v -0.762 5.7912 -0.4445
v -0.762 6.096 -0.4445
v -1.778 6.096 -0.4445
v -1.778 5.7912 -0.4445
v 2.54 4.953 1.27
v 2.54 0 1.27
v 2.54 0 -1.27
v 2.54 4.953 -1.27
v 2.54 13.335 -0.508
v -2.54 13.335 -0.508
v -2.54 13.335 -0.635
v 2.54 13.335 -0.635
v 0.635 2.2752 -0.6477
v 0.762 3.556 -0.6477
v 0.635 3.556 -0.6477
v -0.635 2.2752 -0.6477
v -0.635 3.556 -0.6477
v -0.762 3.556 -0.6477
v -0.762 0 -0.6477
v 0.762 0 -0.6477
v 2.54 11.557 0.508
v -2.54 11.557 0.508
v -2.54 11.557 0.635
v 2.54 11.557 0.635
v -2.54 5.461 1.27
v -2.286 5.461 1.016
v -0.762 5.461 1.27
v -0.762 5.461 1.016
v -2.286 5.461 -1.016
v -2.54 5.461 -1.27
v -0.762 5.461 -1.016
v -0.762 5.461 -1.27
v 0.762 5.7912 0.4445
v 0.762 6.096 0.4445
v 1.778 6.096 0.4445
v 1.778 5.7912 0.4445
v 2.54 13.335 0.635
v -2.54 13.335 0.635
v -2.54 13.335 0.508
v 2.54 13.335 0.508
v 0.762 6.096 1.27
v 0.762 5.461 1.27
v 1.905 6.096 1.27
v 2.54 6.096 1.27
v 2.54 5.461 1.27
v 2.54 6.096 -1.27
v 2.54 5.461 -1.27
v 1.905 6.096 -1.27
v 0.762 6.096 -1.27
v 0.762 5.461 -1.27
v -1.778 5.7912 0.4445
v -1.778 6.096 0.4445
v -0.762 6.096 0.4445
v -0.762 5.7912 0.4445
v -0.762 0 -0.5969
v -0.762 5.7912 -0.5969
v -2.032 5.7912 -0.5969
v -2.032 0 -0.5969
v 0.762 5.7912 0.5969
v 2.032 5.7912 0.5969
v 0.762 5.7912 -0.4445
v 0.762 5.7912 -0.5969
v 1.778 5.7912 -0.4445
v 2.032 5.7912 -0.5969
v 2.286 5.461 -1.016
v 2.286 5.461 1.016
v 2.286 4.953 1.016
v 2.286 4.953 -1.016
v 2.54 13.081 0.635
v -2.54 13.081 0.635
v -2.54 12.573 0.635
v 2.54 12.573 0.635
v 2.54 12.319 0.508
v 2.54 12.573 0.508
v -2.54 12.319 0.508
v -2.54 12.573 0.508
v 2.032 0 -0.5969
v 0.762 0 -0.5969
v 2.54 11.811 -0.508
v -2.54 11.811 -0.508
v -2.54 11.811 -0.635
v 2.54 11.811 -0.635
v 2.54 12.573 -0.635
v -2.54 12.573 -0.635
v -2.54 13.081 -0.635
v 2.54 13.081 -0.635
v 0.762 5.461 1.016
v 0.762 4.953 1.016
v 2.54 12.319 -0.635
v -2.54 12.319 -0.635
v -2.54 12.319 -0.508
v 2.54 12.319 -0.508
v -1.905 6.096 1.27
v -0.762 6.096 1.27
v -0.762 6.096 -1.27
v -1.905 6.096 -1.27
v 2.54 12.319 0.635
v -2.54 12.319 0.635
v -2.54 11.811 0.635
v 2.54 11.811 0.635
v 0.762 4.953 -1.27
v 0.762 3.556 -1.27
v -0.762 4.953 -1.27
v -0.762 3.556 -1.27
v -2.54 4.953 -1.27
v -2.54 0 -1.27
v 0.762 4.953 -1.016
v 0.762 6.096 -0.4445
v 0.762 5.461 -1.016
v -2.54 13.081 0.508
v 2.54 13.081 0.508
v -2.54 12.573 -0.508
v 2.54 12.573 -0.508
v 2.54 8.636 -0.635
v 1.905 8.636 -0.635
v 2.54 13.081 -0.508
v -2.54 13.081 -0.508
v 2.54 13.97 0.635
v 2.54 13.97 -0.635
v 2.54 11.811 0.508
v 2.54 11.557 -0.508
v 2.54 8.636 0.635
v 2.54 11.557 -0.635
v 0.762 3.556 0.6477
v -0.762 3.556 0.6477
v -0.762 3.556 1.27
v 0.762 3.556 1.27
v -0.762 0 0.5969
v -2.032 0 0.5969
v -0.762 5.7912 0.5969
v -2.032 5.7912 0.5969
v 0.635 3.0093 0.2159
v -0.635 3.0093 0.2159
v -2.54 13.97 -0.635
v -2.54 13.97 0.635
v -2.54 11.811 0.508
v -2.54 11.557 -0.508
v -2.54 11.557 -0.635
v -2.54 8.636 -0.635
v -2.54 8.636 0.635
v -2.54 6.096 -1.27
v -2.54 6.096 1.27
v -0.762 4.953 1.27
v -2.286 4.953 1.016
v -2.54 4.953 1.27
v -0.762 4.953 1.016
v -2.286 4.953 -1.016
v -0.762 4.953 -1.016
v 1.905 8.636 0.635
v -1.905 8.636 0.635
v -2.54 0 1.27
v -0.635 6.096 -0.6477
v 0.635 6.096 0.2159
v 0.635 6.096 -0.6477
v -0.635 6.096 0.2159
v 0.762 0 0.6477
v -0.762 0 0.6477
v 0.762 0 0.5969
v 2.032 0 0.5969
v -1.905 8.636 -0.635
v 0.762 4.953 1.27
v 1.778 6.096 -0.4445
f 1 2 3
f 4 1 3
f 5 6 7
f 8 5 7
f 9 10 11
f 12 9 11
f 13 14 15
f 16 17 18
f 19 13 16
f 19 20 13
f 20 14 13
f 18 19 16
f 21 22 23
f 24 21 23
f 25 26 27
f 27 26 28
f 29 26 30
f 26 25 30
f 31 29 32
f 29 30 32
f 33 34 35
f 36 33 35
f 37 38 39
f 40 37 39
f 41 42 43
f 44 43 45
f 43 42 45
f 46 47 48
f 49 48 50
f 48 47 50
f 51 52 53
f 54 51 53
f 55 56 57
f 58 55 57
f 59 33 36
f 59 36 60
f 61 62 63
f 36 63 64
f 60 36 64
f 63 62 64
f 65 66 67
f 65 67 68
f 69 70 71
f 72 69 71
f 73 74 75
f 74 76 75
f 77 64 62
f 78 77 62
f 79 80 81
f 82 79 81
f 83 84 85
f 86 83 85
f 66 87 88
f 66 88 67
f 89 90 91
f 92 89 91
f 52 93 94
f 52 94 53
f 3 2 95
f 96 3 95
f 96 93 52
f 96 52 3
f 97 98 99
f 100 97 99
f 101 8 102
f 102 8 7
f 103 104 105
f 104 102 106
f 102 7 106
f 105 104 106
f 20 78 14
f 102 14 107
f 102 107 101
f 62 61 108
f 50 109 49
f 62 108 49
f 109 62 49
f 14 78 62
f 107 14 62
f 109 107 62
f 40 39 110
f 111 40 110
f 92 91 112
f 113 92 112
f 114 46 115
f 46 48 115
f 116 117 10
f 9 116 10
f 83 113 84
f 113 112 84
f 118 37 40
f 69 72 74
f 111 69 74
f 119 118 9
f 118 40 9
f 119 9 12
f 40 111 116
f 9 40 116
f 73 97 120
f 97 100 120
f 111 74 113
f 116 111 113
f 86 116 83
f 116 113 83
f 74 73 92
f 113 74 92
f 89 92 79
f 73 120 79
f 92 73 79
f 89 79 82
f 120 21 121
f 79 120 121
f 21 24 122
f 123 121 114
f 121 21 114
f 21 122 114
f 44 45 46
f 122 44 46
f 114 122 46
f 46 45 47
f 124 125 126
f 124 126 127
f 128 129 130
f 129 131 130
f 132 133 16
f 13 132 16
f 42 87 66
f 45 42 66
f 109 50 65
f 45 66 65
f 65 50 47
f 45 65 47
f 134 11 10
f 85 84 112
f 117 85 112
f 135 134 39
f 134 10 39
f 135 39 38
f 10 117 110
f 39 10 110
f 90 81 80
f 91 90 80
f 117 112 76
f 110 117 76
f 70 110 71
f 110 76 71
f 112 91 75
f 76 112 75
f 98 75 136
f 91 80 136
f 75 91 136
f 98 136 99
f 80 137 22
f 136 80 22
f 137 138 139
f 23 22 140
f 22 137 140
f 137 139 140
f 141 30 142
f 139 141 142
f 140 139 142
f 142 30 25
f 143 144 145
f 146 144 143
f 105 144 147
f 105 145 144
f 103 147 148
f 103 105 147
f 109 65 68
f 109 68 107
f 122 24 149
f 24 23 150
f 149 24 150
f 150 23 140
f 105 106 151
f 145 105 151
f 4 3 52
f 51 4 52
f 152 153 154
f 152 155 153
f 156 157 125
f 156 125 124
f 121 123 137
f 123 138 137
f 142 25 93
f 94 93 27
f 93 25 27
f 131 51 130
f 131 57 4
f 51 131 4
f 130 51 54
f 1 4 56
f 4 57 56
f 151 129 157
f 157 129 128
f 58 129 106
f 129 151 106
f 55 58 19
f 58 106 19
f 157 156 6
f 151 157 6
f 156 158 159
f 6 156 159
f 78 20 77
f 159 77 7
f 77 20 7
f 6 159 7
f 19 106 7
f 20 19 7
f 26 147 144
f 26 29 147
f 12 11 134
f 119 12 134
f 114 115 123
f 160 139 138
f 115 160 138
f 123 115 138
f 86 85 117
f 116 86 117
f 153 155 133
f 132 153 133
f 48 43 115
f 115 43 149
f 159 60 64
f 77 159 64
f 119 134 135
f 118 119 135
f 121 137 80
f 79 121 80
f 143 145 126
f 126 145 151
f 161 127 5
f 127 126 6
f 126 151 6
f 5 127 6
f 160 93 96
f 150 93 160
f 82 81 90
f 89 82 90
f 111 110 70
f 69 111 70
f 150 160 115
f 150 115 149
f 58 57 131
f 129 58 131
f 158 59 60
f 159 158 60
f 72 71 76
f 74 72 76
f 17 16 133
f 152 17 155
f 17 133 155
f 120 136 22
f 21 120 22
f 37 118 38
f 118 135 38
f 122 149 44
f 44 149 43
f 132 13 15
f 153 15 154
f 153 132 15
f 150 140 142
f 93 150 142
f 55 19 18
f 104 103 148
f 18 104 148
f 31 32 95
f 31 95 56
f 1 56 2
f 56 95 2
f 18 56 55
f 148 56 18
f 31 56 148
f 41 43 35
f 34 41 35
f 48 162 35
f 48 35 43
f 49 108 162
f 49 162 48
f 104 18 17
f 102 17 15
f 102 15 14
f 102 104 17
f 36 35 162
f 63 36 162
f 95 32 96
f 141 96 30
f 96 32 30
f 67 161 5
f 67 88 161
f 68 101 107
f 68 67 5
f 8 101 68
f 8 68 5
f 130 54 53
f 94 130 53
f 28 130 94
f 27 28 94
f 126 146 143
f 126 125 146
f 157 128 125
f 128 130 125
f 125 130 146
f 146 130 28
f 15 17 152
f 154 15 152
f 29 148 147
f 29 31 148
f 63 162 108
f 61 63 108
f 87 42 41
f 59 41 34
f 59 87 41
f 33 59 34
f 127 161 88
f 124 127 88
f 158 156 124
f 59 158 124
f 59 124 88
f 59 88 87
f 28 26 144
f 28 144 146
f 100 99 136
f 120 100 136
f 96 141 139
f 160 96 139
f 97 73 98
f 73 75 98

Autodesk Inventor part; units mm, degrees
sketch "Sketch_1" plane through (0, 0, 0) normal (0, 1, 0) x (1, 0, 0)
  line L0 (-2.54, 1.27) -> (-2.54, -1.27)
  line L1 (-2.54, -1.27) -> (2.54, -1.27)
  line L2 (2.54, -1.27) -> (2.54, 1.27)
  line L3 (2.54, 1.27) -> (-2.54, 1.27)
extrude "Extrusion1" add sketch "Sketch_1" along normal blind 6.096
sketch "Sketch_2" plane through (0, 5.461, 0) normal (0, 1, 0) x (1, 0, 0)
  line L0 (-2.794, 2.54) -> (-2.794, -2.54)
  line L1 (-2.794, -2.54) -> (2.794, -2.54)
  line L2 (2.794, -2.54) -> (2.794, 2.54)
  line L3 (2.794, 2.54) -> (-2.794, 2.54)
  line L4 (-2.286, 1.016) -> (-2.286, -1.016)
  line L5 (-2.286, -1.016) -> (2.286, -1.016)
  line L6 (2.286, -1.016) -> (2.286, 1.016)
  line L7 (2.286, 1.016) -> (-2.286, 1.016)
extrude "Extrusion2" cut sketch "Sketch_2" against normal blind 0.508
sketch "Sketch_3" plane through (0, 6.096, 0) normal (0, 1, 0) x (1, 0, 0)
  line L0 (-0.762, 1.27) -> (-0.762, -1.27)
  line L1 (-0.762, -1.27) -> (0.762, -1.27)
  line L2 (0.762, -1.27) -> (0.762, 1.27)
  line L3 (0.762, 1.27) -> (-0.762, 1.27)
extrude "Extrusion3" cut sketch "Sketch_3" against normal blind 2.54
sketch "Sketch_4" plane through (0, 6.096, 0) normal (0, 1, 0) x (1, 0, 0)
  line L0 (-1.778, 0.4445) -> (-1.778, -0.4445)
  line L1 (-1.778, -0.4445) -> (1.778, -0.4445)
  line L2 (1.778, -0.4445) -> (1.778, 0.4445)
  line L3 (1.778, 0.4445) -> (-1.778, 0.4445)
extrude "Extrusion4" cut sketch "Sketch_4" against normal blind 6.096
sketch "Sketch_5" plane through (0, 5.7912, 0) normal (0, 1, 0) x (1, 0, 0)
  line L0 (-2.032, 0.5969) -> (-2.032, -0.5969)
  line L1 (-2.032, -0.5969) -> (2.032, -0.5969)
  line L2 (2.032, -0.5969) -> (2.032, 0.5969)
  line L3 (2.032, 0.5969) -> (-2.032, 0.5969)
extrude "Extrusion5" cut sketch "Sketch_5" against normal blind 6.096
sketch "Sketch_8" plane through (0, 0, 0) normal (0, 1, 0) x (-1, 0, 0)
  line L0 (0.762, -0.6477) -> (0.762, 0.6477)
  line L1 (0.762, 0.6477) -> (-0.762, 0.6477)
  line L2 (-0.762, 0.6477) -> (-0.762, -0.6477)
  line L3 (-0.762, -0.6477) -> (0.762, -0.6477)
extrude "Extrusion6" cut sketch "Sketch_8" along normal blind 3.556
sketch "Sketch_6" plane through (0, 0, 0) normal (1, 0, 0) x (0, 1, 0)
  line L0 (3.0093, 0.2159) -> (2.2752, -0.6477)
  line L1 (2.2752, -0.6477) -> (6.096, -0.6477)
  line L2 (6.096, -0.6477) -> (6.096, 0.2159)
  line L3 (6.096, 0.2159) -> (3.0093, 0.2159)
extrude "Extrusion7" add sketch "Sketch_6" along normal mid plane 1.27
sketch "Sketch_7" plane through (0, 0, 0) normal (1, 0, 0) x (0, 1, 0)
  line L0 (6.096, 1.27) -> (6.096, -1.27)
  line L1 (6.096, -1.27) -> (8.636, -0.635)
  line L2 (8.636, -0.635) -> (11.557, -0.635)
  line L3 (11.557, -0.635) -> (11.557, -0.508)
  line L4 (11.557, -0.508) -> (11.811, -0.508)
  line L5 (11.811, -0.508) -> (11.811, -0.635)
  line L6 (11.811, -0.635) -> (12.319, -0.635)
  line L7 (12.319, -0.635) -> (12.319, -0.508)
  line L8 (12.319, -0.508) -> (12.573, -0.508)
  line L9 (12.573, -0.508) -> (12.573, -0.635)
  line L10 (12.573, -0.635) -> (13.081, -0.635)
  line L11 (13.081, -0.635) -> (13.081, -0.508)
  line L12 (13.081, -0.508) -> (13.335, -0.508)
  line L13 (13.335, -0.508) -> (13.335, -0.635)
  line L14 (13.335, -0.635) -> (13.97, -0.635)
  line L15 (13.97, -0.635) -> (13.97, 0.635)
  line L16 (13.97, 0.635) -> (13.335, 0.635)
  line L17 (13.335, 0.635) -> (13.335, 0.508)
  line L18 (13.335, 0.508) -> (13.081, 0.508)
  line L19 (13.081, 0.508) -> (13.081, 0.635)
  line L20 (13.081, 0.635) -> (12.573, 0.635)
  line L21 (12.573, 0.635) -> (12.573, 0.508)
  line L22 (12.573, 0.508) -> (12.319, 0.508)
  line L23 (12.319, 0.508) -> (12.319, 0.635)
  line L24 (12.319, 0.635) -> (11.811, 0.635)
  line L25 (11.811, 0.635) -> (11.811, 0.508)
  line L26 (11.811, 0.508) -> (11.557, 0.508)
  line L27 (11.557, 0.508) -> (11.557, 0.635)
  line L28 (11.557, 0.635) -> (8.636, 0.635)
  line L29 (8.636, 0.635) -> (6.096, 1.27)
extrude "Extrusion8" add sketch "Sketch_7" along normal mid plane 5.08
sketch "Sketch_10" plane through (0, 0, 0) normal (1, 0, 0) x (0, 1, 0)
  line L0 (8.636, 1.27) -> (6.096, 1.27)
  line L1 (6.096, 1.27) -> (6.096, -1.27)
  line L2 (6.096, -1.27) -> (8.636, -1.27)
  line L3 (8.636, -1.27) -> (8.636, 1.27)
extrude "Extrusion9" cut sketch "Sketch_10" along normal mid plane 3.81
ref_plane "body_to_dummy_XY" through (0, 0, 0) normal (0, -1, 0) x (1, 0, 0)
ref_plane "body_to_dummy_YZ" through (0, 0, 0) normal (1, 0, 0) x (0, 0, 1)
ref_plane "body_to_dummy_ZX" through (0, 0, 0) normal (0, 0, 1) x (0, -1, 0)
properties part number "SNT-100-BK-H_body"
